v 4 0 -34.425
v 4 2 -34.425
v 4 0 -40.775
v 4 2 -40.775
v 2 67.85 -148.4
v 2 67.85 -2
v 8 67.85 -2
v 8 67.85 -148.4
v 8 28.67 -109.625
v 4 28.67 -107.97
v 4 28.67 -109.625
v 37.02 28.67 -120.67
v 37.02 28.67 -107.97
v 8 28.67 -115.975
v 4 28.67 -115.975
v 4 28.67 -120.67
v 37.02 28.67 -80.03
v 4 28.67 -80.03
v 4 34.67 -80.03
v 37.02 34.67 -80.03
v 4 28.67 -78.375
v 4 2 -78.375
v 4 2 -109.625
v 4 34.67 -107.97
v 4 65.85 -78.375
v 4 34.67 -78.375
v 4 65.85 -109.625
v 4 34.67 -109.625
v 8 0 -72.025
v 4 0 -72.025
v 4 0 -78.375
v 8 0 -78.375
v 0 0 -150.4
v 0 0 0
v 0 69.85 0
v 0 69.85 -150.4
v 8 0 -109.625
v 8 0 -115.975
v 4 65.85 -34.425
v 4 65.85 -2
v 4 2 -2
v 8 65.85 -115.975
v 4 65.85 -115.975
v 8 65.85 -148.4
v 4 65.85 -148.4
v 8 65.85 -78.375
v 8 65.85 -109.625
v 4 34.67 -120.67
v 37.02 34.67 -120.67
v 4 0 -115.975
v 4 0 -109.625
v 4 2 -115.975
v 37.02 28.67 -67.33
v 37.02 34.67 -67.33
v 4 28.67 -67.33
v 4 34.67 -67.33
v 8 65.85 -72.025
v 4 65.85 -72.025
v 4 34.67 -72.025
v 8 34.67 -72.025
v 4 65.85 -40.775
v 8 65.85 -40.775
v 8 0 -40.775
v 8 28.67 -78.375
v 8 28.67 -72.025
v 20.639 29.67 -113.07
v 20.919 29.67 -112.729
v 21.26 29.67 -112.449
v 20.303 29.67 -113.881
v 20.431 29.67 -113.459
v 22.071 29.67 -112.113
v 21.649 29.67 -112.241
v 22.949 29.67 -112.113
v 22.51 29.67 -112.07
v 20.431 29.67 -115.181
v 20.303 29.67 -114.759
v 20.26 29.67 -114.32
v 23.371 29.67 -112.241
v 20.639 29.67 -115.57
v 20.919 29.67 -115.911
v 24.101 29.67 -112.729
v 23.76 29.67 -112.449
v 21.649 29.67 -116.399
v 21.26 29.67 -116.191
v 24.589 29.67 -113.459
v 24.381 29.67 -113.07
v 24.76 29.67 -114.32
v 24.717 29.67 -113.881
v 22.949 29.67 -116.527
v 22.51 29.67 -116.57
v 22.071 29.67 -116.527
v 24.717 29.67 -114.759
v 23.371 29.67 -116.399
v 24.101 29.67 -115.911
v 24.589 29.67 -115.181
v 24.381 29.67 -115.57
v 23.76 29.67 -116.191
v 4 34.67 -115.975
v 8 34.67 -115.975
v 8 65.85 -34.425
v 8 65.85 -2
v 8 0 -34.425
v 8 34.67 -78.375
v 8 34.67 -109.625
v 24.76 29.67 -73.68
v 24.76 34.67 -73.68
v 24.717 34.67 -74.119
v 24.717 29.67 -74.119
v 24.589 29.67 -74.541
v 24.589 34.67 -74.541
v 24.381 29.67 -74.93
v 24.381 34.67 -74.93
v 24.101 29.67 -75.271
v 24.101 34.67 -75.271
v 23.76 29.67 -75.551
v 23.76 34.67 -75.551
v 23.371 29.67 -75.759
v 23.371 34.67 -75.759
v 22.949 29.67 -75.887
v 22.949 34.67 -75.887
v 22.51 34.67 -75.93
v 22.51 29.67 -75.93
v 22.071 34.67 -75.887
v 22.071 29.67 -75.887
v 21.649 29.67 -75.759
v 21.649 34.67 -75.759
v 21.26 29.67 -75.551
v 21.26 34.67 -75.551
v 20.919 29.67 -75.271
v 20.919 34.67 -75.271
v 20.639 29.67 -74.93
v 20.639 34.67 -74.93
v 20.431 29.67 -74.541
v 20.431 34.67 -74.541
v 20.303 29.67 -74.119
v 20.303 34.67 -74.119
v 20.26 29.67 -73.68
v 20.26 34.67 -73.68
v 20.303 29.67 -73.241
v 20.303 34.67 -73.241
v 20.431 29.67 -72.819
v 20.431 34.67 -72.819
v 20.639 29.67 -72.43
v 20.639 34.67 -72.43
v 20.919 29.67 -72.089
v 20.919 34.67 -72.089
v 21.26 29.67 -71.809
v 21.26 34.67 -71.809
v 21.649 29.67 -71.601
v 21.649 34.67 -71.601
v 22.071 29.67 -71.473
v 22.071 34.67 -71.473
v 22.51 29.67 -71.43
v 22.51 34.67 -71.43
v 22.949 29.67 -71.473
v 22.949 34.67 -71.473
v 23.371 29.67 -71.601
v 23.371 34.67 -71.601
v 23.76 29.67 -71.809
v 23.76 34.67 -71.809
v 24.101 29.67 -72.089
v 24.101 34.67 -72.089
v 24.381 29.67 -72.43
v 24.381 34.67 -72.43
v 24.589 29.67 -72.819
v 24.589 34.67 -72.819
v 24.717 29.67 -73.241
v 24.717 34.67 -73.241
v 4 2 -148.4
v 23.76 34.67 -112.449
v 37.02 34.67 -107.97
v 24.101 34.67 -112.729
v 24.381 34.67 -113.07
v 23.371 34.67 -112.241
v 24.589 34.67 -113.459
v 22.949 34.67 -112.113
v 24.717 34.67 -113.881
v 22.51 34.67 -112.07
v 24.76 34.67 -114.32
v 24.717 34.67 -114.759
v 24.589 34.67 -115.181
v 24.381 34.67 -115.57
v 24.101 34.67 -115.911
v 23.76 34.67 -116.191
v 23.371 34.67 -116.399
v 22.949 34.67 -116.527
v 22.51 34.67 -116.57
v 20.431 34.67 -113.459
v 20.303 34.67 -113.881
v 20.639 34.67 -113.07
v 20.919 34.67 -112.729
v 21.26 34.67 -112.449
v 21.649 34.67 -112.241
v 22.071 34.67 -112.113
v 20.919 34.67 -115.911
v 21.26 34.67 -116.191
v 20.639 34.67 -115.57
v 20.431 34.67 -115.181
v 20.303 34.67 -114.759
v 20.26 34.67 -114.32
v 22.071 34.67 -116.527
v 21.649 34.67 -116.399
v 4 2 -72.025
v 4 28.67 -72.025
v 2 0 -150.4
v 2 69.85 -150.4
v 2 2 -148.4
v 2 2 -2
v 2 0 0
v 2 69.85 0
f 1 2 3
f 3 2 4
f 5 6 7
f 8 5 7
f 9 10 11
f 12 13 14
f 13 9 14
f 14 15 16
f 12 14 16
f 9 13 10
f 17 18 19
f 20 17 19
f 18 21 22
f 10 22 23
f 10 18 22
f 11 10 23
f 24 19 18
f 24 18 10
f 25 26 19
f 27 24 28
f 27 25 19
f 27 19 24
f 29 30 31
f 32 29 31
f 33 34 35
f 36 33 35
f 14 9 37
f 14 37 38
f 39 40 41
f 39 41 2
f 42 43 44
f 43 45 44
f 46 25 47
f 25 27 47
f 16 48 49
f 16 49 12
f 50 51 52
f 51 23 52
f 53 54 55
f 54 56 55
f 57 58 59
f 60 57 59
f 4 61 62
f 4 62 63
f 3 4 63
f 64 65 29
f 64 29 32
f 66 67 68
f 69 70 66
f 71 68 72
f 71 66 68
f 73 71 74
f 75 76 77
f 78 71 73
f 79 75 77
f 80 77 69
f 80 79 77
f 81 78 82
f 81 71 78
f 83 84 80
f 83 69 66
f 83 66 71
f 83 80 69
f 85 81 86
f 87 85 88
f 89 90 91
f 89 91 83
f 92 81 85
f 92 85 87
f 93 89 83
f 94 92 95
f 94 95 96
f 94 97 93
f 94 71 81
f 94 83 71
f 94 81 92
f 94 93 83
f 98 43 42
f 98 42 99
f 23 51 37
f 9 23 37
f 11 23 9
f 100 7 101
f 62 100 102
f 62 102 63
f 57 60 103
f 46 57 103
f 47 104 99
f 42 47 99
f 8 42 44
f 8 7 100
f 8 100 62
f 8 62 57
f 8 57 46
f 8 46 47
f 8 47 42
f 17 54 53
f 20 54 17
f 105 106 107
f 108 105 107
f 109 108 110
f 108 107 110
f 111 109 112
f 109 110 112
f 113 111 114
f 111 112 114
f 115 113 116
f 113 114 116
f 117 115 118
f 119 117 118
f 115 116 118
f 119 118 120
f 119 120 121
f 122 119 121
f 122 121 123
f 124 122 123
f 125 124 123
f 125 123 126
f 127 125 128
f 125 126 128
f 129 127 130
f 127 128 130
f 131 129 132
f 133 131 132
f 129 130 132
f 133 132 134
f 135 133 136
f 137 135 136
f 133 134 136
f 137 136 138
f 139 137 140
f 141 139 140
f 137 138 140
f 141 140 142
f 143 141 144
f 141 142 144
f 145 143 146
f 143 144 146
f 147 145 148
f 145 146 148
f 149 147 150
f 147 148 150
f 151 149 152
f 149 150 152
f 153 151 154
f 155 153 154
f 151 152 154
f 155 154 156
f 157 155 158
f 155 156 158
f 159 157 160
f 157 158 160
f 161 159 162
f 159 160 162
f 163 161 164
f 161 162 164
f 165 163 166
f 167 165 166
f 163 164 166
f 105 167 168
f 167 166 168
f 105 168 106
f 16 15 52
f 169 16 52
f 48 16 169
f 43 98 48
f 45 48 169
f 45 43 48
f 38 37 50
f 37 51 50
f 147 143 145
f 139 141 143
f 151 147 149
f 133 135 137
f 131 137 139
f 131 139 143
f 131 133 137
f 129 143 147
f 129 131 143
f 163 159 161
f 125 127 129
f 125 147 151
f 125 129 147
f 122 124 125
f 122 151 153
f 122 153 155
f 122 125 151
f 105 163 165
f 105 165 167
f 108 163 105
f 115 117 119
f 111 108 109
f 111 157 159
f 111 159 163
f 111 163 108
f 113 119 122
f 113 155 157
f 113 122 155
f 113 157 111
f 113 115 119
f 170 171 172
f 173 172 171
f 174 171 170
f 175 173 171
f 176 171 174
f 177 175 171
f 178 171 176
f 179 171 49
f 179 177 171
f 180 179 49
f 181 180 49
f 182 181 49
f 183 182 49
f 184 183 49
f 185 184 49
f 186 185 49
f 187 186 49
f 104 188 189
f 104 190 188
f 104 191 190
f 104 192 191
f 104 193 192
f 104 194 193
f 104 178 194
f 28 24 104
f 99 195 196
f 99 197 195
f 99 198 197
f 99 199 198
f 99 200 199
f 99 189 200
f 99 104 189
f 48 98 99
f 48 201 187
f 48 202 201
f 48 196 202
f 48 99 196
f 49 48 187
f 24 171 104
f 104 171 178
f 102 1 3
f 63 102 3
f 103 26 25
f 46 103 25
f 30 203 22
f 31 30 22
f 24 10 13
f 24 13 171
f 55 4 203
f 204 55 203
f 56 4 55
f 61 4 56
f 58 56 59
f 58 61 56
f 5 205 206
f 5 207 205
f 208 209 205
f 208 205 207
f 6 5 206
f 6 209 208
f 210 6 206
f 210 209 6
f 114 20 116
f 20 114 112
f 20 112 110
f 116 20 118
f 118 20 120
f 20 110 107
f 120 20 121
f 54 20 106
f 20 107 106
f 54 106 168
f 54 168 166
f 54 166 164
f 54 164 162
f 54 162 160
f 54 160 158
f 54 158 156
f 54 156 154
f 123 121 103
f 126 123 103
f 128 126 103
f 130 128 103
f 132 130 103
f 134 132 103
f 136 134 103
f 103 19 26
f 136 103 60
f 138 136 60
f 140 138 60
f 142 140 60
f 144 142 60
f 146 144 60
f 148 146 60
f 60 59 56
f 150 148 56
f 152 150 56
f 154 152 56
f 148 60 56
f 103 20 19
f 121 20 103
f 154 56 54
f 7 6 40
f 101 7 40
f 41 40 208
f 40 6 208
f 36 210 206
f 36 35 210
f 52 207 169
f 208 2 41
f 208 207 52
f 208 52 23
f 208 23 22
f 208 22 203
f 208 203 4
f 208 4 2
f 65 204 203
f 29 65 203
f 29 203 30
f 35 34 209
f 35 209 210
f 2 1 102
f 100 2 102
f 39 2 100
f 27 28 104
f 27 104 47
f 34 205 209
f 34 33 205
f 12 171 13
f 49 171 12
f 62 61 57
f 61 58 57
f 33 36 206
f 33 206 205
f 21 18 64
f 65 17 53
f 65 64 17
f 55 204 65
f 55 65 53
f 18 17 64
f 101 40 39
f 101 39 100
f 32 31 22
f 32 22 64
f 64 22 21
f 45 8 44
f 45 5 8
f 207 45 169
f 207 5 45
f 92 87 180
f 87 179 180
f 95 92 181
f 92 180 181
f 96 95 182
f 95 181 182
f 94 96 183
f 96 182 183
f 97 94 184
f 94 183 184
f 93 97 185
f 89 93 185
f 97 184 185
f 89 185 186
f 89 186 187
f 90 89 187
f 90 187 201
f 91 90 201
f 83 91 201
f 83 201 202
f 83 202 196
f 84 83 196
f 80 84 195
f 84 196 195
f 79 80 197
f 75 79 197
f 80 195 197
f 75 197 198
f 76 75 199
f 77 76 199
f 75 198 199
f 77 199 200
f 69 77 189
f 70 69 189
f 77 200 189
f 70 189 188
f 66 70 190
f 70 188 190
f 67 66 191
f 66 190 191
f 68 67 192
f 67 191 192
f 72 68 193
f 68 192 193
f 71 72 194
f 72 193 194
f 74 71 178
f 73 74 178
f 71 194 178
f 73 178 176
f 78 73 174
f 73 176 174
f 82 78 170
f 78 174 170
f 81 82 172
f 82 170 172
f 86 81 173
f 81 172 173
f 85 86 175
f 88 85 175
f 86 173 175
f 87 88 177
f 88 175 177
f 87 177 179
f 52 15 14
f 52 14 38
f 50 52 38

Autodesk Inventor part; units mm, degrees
ref_plane "YZ Plane" through (0, 0, 0) normal (1, 0, 0) x (0, 1, 0)
ref_plane "XZ Plane" through (0, 0, 0) normal (0, 1, 0) x (-1, 0, 0)
ref_plane "XY Plane" through (0, 0, 0) normal (0, 0, 1) x (1, 0, 0)
sketch "Sketch1" plane through (0, 0, 0) normal (1, 0, 0) x (0, 1, 0)
  line L0 (0, 0) -> (69.85, 0)
  line L1 (69.85, 0) -> (69.85, -150.4)
  line L2 (69.85, -150.4) -> (0, -150.4)
  line L3 (0, -150.4) -> (0, 0)
  dimension "d0" = 69.85
  dimension "d1" = 150.4
extrude "Extrusion1" add sketch "Sketch1" along normal blind 2
sketch "Sketch2" plane through (2, 0, 0) normal (1, 0, 0) x (0, 0, -1)
  line L0 (150.4, 0) -> (150.4, 69.85) projected
  line L1 (150.4, 69.85) -> (0, 69.85) projected
  line L2 (0, 69.85) -> (0, 0) projected
  line L3 (0, 0) -> (150.4, 0) projected
  line L4 (150.4, 69.85) -> (148.4, 69.85)
  line L5 (148.4, 69.85) -> (148.4, 0)
  line L6 (148.4, 0) -> (150.4, 0)
  line L7 (150.4, 0) -> (150.4, 69.85)
  line L8 (0, 69.85) -> (2, 69.85)
  line L9 (2, 69.85) -> (2, 0)
  line L10 (2, 0) -> (0, 0)
  line L11 (0, 0) -> (0, 69.85)
  line L12 (0, 0) -> (150.4, 0)
  line L13 (150.4, 0) -> (150.4, 2)
  line L14 (150.4, 2) -> (0, 2)
  line L15 (0, 2) -> (0, 0)
  point P0 (2, 2)
  point P1 (148.4, 2)
  dimension "d4" = 2
  dimension "d5" = 2
  dimension "d6" = 2
extrude "Extrusion2" add sketch "Sketch2" along normal blind 2 contours L14 L9 L1 L5
sketch "Sketch3" plane through (4, 0, 0) normal (1, 0, 0) x (0, 0, -1)
  line L0 (150.4, 0) -> (150.4, 69.85) projected
  line L1 (0, 0) -> (150.4, 0) projected
  line L2 (0, 69.85) -> (0, 0) projected
  line L3 (150.4, 69.85) -> (0, 69.85) projected
  line L4 (0, 69.85) -> (75.2, 69.85) construction
  line L5 (75.2, 69.85) -> (75.2, 0) construction
  line L6 (75.2, 0) -> (0, 0) construction
  line L7 (0, 0) -> (0, 69.85) construction
  line L8 (0, 0) -> (150.4, 0) construction
  line L9 (0, 0) -> (37.6, 0) construction
  line L10 (37.6, 0) -> (37.6, 69.85) construction
  line L11 (37.6, 69.85) -> (0, 69.85) construction
  line L12 (0, 69.85) -> (0, 0) construction
  line L13 (150.4, 0) -> (150.4, 69.85) construction
  line L14 (75.2, 69.85) -> (150.4, 69.85) construction
  line L15 (150.4, 69.85) -> (150.4, 0) construction
  line L16 (150.4, 0) -> (75.2, 0) construction
  line L17 (75.2, 0) -> (75.2, 69.85) construction
  line L18 (75.2, 0) -> (112.8, 0) construction
  line L19 (112.8, 0) -> (112.8, 69.85) construction
  line L20 (112.8, 69.85) -> (75.2, 69.85) construction
  line L21 (75.2, 69.85) -> (75.2, 0) construction
  line L22 (34.425, 0) -> (34.425, 69.85) construction
  line L23 (34.425, 69.85) -> (40.775, 69.85) construction
  line L24 (40.775, 69.85) -> (40.775, 0) construction
  line L25 (40.775, 0) -> (34.425, 0) construction
  line L26 (34.425, 0) -> (40.775, 69.85) construction
  line L27 (34.425, 69.85) -> (40.775, 0) construction
  line L28 (72.025, 0) -> (72.025, 69.85) construction
  line L29 (72.025, 69.85) -> (78.375, 69.85) construction
  line L30 (78.375, 69.85) -> (78.375, 0) construction
  line L31 (78.375, 0) -> (72.025, 0) construction
  line L32 (72.025, 0) -> (78.375, 69.85) construction
  line L33 (72.025, 69.85) -> (78.375, 0) construction
  line L34 (109.625, 0) -> (109.625, 69.85) construction
  line L35 (109.625, 69.85) -> (115.975, 69.85) construction
  line L36 (115.975, 69.85) -> (115.975, 0) construction
  line L37 (115.975, 0) -> (109.625, 0) construction
  line L38 (109.625, 0) -> (115.975, 69.85) construction
  line L39 (109.625, 69.85) -> (115.975, 0) construction
  line L40 (34.425, 69.85) -> (40.775, 69.85)
  line L41 (40.775, 69.85) -> (40.775, 0)
  line L42 (40.775, 0) -> (34.425, 0)
  line L43 (34.425, 0) -> (34.425, 69.85)
  line L44 (72.025, 0) -> (78.375, 0)
  line L45 (78.375, 0) -> (78.375, 69.85)
  line L46 (78.375, 69.85) -> (72.025, 69.85)
  line L47 (72.025, 69.85) -> (72.025, 0)
  line L48 (109.625, 69.85) -> (115.975, 69.85)
  line L49 (115.975, 69.85) -> (115.975, 0)
  line L50 (115.975, 0) -> (109.625, 0)
  line L51 (109.625, 0) -> (109.625, 69.85)
  point P0 (37.6, 34.925)
  point P1 (75.2, 34.925)
  point P2 (112.8, 34.925)
  dimension "d9" = 6.35
  dimension "d10" = 6.35
  dimension "d11" = 6.35
extrude "Extrusion3" add sketch "Sketch3" along normal blind 4 contours L1 L51 L3 L49 | L1 L47 L3 L45 | L1 L43 L3 L41
sketch "Sketch4" plane through (0, 69.85, 0) normal (0, 1, 0) x (1, 0, 0)
  line L0 (0, 150.4) -> (0, 0) projected
  line L1 (0, 150.4) -> (0, 0) construction
  line L2 (0, 0) -> (2, 0) construction
  line L3 (2, 2) -> (2, 0) construction
  line L4 (2, 2) -> (4, 2) construction
  line L5 (4, 34.425) -> (4, 2) construction
  line L6 (4, 34.425) -> (8, 34.425) construction
  line L7 (8, 40.775) -> (8, 34.425) construction
  line L8 (4, 40.775) -> (8, 40.775) construction
  line L9 (4, 72.025) -> (4, 40.775) construction
  line L10 (4, 72.025) -> (8, 72.025) construction
  line L11 (8, 78.375) -> (8, 72.025) construction
  line L12 (4, 78.375) -> (8, 78.375) construction
  line L13 (4, 109.625) -> (4, 78.375) construction
  line L14 (4, 109.625) -> (8, 109.625) construction
  line L15 (8, 115.975) -> (8, 109.625) construction
  line L16 (4, 115.975) -> (8, 115.975) construction
  line L17 (4, 148.4) -> (4, 115.975) construction
  line L18 (2, 148.4) -> (4, 148.4) construction
  line L19 (2, 150.4) -> (2, 148.4) construction
  line L20 (0, 150.4) -> (2, 150.4) construction
  line L21 (2, 0) -> (0, 0)
  line L22 (0, 0) -> (0, 150.4)
  line L23 (0, 150.4) -> (2, 150.4)
  line L24 (2, 150.4) -> (2, 0)
  line L25 (2, 0) -> (8, 0)
  line L26 (8, 0) -> (8, 150.4)
  line L27 (8, 150.4) -> (2, 150.4)
  line L28 (2, 150.4) -> (2, 0)
extrude "Extrusion4" cut sketch "Sketch4" against normal blind 2 contours L27 L26 L25 L24
sketch "Sketch5" plane through (0, 67.85, 0) normal (0, 1, 0) x (1, 0, 0)
  line L0 (4, 115.975) -> (8, 115.975) projected
  line L1 (4, 148.4) -> (4, 115.975) projected
  line L2 (2, 148.4) -> (4, 148.4) projected
  line L3 (2, 2) -> (2, 148.4) projected
  line L4 (4, 2) -> (2, 2) projected
  line L5 (4, 34.425) -> (4, 2) projected
  line L6 (8, 34.425) -> (4, 34.425) projected
  line L7 (8, 40.775) -> (8, 34.425) projected
  line L8 (4, 40.775) -> (8, 40.775) projected
  line L9 (4, 72.025) -> (4, 40.775) projected
  line L10 (8, 72.025) -> (4, 72.025) projected
  line L11 (8, 78.375) -> (8, 72.025) projected
  line L12 (4, 78.375) -> (8, 78.375) projected
  line L13 (4, 109.625) -> (4, 78.375) projected
  line L14 (8, 109.625) -> (4, 109.625) projected
  line L15 (8, 115.975) -> (8, 109.625) projected
  line L16 (2, 2) -> (4, 2) projected
  line L17 (2, 2) -> (8, 2)
  line L18 (8, 2) -> (8, 148.4)
  line L19 (8, 148.4) -> (2, 148.4)
  line L20 (2, 148.4) -> (2, 2)
  point P0 (0, 0)
  point P1 (4, 2)
extrude "Extrusion5" add sketch "Sketch5" against normal blind 2 contours L1 L19 L18 L0 | L18 L12 L13 L14 | L18 L8 L9 L10 | L5 L6 L18 L17
sketch "Sketch6" plane through (4, 0, 0) normal (1, 0, 0) x (0, 0, -1)
  line L0 (2, 67.85) -> (148.4, 67.85) construction
  line L1 (2, 67.85) -> (2, 65.85) construction
  line L2 (34.425, 65.85) -> (2, 65.85) construction
  line L3 (34.425, 65.85) -> (34.425, 0) construction
  line L4 (34.425, 0) -> (40.775, 0) construction
  line L5 (40.775, 0) -> (40.775, 65.85) construction
  line L6 (72.025, 65.85) -> (40.775, 65.85) construction
  line L7 (72.025, 65.85) -> (72.025, 0) construction
  line L8 (72.025, 0) -> (78.375, 0) construction
  line L9 (78.375, 0) -> (78.375, 65.85) construction
  line L10 (109.625, 65.85) -> (78.375, 65.85) construction
  line L11 (109.625, 65.85) -> (109.625, 0) construction
  line L12 (109.625, 0) -> (115.975, 0) construction
  line L13 (115.975, 0) -> (115.975, 65.85) construction
  line L14 (148.4, 65.85) -> (115.975, 65.85) construction
  line L15 (148.4, 67.85) -> (148.4, 65.85) construction
  line L16 (109.625, 65.85) -> (78.375, 65.85) construction
  line L17 (78.375, 65.85) -> (78.375, 2) construction
  line L18 (78.375, 2) -> (109.625, 2) construction
  line L19 (109.625, 2) -> (109.625, 65.85) construction
  line L20 (148.4, 65.85) -> (115.975, 65.85) construction
  line L21 (115.975, 65.85) -> (115.975, 2) construction
  line L22 (115.975, 2) -> (148.4, 2) construction
  line L23 (148.4, 2) -> (148.4, 65.85) construction
  line L24 (72.025, 65.85) -> (40.775, 65.85) construction
  line L25 (40.775, 65.85) -> (40.775, 2) construction
  line L26 (40.775, 2) -> (72.025, 2) construction
  line L27 (72.025, 2) -> (72.025, 65.85) construction
  line L28 (78.375, 2) -> (78.375, 28.67) construction
  line L29 (94, 28.67) -> (114.32, 28.67)
  line L30 (114.32, 28.67) -> (73.68, 28.67)
  line L31 (73.68, 28.67) -> (67.33, 28.67)
  line L32 (67.33, 28.67) -> (80.03, 28.67)
  line L33 (80.03, 28.67) -> (80.03, 34.67)
  line L34 (80.03, 34.67) -> (67.33, 34.67)
  line L35 (67.33, 34.67) -> (67.33, 28.67)
  line L36 (114.32, 28.67) -> (120.67, 28.67)
  line L37 (120.67, 28.67) -> (107.97, 28.67)
  line L38 (107.97, 28.67) -> (107.97, 34.67)
  line L39 (107.97, 34.67) -> (120.67, 34.67)
  line L40 (120.67, 34.67) -> (120.67, 28.67)
  point P0 (0, 0)
  dimension "d18" = 26.67
  dimension "d31" = 20.32
  dimension "d32" = 40.64
  dimension "d33" = 6.35
  dimension "d34" = 12.7
  dimension "d35" = 6
  dimension "d36" = 6.35
  dimension "d37" = 12.7
  dimension "d38" = 6
extrude "Extrusion6" add sketch "Sketch6" along normal blind 33.02
sketch "Sketch12" plane through (4, 34.67, -67.33) normal (0, 1, 0) x (1, 0, 0)
  line L0 (4, 11.045) -> (0, 11.045) construction
  line L1 (4, 4.695) -> (4, 11.045) construction
  line L2 (0, 4.695) -> (4, 4.695) construction
  line L3 (0, 0) -> (0, 4.695) construction
  line L4 (0, 0) -> (33.02, 0) construction
  line L5 (33.02, 12.7) -> (33.02, 0) construction
  line L6 (0, 12.7) -> (33.02, 12.7) construction
  line L7 (0, 11.045) -> (0, 12.7) construction
  line L8 (4, 48.645) -> (0, 48.645) construction
  line L9 (4, 42.295) -> (4, 48.645) construction
  line L10 (0, 42.295) -> (4, 42.295) construction
  line L11 (0, 40.64) -> (0, 42.295) construction
  line L12 (0, 40.64) -> (33.02, 40.64) construction
  line L13 (33.02, 53.34) -> (33.02, 40.64) construction
  line L14 (0, 53.34) -> (33.02, 53.34) construction
  line L15 (0, 48.645) -> (0, 53.34) construction
  line L16 (4, 4.695) -> (4, -26.555) construction
  line L17 (4, 4.695) -> (33.02, 4.695) construction
  line L18 (33.02, 4.695) -> (33.02, 0) construction
  line L19 (33.02, 0) -> (4, 0) construction
  line L20 (4, 0) -> (4, 4.695) construction
  circle A0 centre (18.51, 6.35) radius 2.25 construction
  line L21 (4, 48.645) -> (33.02, 48.645) construction
  circle A1 centre (18.51, 46.99) radius 2.25 construction
  circle A2 centre (18.51, 6.35) radius 2.25
  circle A3 centre (18.51, 46.99) radius 2.25
  point P0 (-4, -67.33)
  dimension "d39" = 4.5
  dimension "d40" = 4.5
extrude "Extrusion10" cut sketch "Sketch12" against normal blind 5
properties part number "leftwall"
